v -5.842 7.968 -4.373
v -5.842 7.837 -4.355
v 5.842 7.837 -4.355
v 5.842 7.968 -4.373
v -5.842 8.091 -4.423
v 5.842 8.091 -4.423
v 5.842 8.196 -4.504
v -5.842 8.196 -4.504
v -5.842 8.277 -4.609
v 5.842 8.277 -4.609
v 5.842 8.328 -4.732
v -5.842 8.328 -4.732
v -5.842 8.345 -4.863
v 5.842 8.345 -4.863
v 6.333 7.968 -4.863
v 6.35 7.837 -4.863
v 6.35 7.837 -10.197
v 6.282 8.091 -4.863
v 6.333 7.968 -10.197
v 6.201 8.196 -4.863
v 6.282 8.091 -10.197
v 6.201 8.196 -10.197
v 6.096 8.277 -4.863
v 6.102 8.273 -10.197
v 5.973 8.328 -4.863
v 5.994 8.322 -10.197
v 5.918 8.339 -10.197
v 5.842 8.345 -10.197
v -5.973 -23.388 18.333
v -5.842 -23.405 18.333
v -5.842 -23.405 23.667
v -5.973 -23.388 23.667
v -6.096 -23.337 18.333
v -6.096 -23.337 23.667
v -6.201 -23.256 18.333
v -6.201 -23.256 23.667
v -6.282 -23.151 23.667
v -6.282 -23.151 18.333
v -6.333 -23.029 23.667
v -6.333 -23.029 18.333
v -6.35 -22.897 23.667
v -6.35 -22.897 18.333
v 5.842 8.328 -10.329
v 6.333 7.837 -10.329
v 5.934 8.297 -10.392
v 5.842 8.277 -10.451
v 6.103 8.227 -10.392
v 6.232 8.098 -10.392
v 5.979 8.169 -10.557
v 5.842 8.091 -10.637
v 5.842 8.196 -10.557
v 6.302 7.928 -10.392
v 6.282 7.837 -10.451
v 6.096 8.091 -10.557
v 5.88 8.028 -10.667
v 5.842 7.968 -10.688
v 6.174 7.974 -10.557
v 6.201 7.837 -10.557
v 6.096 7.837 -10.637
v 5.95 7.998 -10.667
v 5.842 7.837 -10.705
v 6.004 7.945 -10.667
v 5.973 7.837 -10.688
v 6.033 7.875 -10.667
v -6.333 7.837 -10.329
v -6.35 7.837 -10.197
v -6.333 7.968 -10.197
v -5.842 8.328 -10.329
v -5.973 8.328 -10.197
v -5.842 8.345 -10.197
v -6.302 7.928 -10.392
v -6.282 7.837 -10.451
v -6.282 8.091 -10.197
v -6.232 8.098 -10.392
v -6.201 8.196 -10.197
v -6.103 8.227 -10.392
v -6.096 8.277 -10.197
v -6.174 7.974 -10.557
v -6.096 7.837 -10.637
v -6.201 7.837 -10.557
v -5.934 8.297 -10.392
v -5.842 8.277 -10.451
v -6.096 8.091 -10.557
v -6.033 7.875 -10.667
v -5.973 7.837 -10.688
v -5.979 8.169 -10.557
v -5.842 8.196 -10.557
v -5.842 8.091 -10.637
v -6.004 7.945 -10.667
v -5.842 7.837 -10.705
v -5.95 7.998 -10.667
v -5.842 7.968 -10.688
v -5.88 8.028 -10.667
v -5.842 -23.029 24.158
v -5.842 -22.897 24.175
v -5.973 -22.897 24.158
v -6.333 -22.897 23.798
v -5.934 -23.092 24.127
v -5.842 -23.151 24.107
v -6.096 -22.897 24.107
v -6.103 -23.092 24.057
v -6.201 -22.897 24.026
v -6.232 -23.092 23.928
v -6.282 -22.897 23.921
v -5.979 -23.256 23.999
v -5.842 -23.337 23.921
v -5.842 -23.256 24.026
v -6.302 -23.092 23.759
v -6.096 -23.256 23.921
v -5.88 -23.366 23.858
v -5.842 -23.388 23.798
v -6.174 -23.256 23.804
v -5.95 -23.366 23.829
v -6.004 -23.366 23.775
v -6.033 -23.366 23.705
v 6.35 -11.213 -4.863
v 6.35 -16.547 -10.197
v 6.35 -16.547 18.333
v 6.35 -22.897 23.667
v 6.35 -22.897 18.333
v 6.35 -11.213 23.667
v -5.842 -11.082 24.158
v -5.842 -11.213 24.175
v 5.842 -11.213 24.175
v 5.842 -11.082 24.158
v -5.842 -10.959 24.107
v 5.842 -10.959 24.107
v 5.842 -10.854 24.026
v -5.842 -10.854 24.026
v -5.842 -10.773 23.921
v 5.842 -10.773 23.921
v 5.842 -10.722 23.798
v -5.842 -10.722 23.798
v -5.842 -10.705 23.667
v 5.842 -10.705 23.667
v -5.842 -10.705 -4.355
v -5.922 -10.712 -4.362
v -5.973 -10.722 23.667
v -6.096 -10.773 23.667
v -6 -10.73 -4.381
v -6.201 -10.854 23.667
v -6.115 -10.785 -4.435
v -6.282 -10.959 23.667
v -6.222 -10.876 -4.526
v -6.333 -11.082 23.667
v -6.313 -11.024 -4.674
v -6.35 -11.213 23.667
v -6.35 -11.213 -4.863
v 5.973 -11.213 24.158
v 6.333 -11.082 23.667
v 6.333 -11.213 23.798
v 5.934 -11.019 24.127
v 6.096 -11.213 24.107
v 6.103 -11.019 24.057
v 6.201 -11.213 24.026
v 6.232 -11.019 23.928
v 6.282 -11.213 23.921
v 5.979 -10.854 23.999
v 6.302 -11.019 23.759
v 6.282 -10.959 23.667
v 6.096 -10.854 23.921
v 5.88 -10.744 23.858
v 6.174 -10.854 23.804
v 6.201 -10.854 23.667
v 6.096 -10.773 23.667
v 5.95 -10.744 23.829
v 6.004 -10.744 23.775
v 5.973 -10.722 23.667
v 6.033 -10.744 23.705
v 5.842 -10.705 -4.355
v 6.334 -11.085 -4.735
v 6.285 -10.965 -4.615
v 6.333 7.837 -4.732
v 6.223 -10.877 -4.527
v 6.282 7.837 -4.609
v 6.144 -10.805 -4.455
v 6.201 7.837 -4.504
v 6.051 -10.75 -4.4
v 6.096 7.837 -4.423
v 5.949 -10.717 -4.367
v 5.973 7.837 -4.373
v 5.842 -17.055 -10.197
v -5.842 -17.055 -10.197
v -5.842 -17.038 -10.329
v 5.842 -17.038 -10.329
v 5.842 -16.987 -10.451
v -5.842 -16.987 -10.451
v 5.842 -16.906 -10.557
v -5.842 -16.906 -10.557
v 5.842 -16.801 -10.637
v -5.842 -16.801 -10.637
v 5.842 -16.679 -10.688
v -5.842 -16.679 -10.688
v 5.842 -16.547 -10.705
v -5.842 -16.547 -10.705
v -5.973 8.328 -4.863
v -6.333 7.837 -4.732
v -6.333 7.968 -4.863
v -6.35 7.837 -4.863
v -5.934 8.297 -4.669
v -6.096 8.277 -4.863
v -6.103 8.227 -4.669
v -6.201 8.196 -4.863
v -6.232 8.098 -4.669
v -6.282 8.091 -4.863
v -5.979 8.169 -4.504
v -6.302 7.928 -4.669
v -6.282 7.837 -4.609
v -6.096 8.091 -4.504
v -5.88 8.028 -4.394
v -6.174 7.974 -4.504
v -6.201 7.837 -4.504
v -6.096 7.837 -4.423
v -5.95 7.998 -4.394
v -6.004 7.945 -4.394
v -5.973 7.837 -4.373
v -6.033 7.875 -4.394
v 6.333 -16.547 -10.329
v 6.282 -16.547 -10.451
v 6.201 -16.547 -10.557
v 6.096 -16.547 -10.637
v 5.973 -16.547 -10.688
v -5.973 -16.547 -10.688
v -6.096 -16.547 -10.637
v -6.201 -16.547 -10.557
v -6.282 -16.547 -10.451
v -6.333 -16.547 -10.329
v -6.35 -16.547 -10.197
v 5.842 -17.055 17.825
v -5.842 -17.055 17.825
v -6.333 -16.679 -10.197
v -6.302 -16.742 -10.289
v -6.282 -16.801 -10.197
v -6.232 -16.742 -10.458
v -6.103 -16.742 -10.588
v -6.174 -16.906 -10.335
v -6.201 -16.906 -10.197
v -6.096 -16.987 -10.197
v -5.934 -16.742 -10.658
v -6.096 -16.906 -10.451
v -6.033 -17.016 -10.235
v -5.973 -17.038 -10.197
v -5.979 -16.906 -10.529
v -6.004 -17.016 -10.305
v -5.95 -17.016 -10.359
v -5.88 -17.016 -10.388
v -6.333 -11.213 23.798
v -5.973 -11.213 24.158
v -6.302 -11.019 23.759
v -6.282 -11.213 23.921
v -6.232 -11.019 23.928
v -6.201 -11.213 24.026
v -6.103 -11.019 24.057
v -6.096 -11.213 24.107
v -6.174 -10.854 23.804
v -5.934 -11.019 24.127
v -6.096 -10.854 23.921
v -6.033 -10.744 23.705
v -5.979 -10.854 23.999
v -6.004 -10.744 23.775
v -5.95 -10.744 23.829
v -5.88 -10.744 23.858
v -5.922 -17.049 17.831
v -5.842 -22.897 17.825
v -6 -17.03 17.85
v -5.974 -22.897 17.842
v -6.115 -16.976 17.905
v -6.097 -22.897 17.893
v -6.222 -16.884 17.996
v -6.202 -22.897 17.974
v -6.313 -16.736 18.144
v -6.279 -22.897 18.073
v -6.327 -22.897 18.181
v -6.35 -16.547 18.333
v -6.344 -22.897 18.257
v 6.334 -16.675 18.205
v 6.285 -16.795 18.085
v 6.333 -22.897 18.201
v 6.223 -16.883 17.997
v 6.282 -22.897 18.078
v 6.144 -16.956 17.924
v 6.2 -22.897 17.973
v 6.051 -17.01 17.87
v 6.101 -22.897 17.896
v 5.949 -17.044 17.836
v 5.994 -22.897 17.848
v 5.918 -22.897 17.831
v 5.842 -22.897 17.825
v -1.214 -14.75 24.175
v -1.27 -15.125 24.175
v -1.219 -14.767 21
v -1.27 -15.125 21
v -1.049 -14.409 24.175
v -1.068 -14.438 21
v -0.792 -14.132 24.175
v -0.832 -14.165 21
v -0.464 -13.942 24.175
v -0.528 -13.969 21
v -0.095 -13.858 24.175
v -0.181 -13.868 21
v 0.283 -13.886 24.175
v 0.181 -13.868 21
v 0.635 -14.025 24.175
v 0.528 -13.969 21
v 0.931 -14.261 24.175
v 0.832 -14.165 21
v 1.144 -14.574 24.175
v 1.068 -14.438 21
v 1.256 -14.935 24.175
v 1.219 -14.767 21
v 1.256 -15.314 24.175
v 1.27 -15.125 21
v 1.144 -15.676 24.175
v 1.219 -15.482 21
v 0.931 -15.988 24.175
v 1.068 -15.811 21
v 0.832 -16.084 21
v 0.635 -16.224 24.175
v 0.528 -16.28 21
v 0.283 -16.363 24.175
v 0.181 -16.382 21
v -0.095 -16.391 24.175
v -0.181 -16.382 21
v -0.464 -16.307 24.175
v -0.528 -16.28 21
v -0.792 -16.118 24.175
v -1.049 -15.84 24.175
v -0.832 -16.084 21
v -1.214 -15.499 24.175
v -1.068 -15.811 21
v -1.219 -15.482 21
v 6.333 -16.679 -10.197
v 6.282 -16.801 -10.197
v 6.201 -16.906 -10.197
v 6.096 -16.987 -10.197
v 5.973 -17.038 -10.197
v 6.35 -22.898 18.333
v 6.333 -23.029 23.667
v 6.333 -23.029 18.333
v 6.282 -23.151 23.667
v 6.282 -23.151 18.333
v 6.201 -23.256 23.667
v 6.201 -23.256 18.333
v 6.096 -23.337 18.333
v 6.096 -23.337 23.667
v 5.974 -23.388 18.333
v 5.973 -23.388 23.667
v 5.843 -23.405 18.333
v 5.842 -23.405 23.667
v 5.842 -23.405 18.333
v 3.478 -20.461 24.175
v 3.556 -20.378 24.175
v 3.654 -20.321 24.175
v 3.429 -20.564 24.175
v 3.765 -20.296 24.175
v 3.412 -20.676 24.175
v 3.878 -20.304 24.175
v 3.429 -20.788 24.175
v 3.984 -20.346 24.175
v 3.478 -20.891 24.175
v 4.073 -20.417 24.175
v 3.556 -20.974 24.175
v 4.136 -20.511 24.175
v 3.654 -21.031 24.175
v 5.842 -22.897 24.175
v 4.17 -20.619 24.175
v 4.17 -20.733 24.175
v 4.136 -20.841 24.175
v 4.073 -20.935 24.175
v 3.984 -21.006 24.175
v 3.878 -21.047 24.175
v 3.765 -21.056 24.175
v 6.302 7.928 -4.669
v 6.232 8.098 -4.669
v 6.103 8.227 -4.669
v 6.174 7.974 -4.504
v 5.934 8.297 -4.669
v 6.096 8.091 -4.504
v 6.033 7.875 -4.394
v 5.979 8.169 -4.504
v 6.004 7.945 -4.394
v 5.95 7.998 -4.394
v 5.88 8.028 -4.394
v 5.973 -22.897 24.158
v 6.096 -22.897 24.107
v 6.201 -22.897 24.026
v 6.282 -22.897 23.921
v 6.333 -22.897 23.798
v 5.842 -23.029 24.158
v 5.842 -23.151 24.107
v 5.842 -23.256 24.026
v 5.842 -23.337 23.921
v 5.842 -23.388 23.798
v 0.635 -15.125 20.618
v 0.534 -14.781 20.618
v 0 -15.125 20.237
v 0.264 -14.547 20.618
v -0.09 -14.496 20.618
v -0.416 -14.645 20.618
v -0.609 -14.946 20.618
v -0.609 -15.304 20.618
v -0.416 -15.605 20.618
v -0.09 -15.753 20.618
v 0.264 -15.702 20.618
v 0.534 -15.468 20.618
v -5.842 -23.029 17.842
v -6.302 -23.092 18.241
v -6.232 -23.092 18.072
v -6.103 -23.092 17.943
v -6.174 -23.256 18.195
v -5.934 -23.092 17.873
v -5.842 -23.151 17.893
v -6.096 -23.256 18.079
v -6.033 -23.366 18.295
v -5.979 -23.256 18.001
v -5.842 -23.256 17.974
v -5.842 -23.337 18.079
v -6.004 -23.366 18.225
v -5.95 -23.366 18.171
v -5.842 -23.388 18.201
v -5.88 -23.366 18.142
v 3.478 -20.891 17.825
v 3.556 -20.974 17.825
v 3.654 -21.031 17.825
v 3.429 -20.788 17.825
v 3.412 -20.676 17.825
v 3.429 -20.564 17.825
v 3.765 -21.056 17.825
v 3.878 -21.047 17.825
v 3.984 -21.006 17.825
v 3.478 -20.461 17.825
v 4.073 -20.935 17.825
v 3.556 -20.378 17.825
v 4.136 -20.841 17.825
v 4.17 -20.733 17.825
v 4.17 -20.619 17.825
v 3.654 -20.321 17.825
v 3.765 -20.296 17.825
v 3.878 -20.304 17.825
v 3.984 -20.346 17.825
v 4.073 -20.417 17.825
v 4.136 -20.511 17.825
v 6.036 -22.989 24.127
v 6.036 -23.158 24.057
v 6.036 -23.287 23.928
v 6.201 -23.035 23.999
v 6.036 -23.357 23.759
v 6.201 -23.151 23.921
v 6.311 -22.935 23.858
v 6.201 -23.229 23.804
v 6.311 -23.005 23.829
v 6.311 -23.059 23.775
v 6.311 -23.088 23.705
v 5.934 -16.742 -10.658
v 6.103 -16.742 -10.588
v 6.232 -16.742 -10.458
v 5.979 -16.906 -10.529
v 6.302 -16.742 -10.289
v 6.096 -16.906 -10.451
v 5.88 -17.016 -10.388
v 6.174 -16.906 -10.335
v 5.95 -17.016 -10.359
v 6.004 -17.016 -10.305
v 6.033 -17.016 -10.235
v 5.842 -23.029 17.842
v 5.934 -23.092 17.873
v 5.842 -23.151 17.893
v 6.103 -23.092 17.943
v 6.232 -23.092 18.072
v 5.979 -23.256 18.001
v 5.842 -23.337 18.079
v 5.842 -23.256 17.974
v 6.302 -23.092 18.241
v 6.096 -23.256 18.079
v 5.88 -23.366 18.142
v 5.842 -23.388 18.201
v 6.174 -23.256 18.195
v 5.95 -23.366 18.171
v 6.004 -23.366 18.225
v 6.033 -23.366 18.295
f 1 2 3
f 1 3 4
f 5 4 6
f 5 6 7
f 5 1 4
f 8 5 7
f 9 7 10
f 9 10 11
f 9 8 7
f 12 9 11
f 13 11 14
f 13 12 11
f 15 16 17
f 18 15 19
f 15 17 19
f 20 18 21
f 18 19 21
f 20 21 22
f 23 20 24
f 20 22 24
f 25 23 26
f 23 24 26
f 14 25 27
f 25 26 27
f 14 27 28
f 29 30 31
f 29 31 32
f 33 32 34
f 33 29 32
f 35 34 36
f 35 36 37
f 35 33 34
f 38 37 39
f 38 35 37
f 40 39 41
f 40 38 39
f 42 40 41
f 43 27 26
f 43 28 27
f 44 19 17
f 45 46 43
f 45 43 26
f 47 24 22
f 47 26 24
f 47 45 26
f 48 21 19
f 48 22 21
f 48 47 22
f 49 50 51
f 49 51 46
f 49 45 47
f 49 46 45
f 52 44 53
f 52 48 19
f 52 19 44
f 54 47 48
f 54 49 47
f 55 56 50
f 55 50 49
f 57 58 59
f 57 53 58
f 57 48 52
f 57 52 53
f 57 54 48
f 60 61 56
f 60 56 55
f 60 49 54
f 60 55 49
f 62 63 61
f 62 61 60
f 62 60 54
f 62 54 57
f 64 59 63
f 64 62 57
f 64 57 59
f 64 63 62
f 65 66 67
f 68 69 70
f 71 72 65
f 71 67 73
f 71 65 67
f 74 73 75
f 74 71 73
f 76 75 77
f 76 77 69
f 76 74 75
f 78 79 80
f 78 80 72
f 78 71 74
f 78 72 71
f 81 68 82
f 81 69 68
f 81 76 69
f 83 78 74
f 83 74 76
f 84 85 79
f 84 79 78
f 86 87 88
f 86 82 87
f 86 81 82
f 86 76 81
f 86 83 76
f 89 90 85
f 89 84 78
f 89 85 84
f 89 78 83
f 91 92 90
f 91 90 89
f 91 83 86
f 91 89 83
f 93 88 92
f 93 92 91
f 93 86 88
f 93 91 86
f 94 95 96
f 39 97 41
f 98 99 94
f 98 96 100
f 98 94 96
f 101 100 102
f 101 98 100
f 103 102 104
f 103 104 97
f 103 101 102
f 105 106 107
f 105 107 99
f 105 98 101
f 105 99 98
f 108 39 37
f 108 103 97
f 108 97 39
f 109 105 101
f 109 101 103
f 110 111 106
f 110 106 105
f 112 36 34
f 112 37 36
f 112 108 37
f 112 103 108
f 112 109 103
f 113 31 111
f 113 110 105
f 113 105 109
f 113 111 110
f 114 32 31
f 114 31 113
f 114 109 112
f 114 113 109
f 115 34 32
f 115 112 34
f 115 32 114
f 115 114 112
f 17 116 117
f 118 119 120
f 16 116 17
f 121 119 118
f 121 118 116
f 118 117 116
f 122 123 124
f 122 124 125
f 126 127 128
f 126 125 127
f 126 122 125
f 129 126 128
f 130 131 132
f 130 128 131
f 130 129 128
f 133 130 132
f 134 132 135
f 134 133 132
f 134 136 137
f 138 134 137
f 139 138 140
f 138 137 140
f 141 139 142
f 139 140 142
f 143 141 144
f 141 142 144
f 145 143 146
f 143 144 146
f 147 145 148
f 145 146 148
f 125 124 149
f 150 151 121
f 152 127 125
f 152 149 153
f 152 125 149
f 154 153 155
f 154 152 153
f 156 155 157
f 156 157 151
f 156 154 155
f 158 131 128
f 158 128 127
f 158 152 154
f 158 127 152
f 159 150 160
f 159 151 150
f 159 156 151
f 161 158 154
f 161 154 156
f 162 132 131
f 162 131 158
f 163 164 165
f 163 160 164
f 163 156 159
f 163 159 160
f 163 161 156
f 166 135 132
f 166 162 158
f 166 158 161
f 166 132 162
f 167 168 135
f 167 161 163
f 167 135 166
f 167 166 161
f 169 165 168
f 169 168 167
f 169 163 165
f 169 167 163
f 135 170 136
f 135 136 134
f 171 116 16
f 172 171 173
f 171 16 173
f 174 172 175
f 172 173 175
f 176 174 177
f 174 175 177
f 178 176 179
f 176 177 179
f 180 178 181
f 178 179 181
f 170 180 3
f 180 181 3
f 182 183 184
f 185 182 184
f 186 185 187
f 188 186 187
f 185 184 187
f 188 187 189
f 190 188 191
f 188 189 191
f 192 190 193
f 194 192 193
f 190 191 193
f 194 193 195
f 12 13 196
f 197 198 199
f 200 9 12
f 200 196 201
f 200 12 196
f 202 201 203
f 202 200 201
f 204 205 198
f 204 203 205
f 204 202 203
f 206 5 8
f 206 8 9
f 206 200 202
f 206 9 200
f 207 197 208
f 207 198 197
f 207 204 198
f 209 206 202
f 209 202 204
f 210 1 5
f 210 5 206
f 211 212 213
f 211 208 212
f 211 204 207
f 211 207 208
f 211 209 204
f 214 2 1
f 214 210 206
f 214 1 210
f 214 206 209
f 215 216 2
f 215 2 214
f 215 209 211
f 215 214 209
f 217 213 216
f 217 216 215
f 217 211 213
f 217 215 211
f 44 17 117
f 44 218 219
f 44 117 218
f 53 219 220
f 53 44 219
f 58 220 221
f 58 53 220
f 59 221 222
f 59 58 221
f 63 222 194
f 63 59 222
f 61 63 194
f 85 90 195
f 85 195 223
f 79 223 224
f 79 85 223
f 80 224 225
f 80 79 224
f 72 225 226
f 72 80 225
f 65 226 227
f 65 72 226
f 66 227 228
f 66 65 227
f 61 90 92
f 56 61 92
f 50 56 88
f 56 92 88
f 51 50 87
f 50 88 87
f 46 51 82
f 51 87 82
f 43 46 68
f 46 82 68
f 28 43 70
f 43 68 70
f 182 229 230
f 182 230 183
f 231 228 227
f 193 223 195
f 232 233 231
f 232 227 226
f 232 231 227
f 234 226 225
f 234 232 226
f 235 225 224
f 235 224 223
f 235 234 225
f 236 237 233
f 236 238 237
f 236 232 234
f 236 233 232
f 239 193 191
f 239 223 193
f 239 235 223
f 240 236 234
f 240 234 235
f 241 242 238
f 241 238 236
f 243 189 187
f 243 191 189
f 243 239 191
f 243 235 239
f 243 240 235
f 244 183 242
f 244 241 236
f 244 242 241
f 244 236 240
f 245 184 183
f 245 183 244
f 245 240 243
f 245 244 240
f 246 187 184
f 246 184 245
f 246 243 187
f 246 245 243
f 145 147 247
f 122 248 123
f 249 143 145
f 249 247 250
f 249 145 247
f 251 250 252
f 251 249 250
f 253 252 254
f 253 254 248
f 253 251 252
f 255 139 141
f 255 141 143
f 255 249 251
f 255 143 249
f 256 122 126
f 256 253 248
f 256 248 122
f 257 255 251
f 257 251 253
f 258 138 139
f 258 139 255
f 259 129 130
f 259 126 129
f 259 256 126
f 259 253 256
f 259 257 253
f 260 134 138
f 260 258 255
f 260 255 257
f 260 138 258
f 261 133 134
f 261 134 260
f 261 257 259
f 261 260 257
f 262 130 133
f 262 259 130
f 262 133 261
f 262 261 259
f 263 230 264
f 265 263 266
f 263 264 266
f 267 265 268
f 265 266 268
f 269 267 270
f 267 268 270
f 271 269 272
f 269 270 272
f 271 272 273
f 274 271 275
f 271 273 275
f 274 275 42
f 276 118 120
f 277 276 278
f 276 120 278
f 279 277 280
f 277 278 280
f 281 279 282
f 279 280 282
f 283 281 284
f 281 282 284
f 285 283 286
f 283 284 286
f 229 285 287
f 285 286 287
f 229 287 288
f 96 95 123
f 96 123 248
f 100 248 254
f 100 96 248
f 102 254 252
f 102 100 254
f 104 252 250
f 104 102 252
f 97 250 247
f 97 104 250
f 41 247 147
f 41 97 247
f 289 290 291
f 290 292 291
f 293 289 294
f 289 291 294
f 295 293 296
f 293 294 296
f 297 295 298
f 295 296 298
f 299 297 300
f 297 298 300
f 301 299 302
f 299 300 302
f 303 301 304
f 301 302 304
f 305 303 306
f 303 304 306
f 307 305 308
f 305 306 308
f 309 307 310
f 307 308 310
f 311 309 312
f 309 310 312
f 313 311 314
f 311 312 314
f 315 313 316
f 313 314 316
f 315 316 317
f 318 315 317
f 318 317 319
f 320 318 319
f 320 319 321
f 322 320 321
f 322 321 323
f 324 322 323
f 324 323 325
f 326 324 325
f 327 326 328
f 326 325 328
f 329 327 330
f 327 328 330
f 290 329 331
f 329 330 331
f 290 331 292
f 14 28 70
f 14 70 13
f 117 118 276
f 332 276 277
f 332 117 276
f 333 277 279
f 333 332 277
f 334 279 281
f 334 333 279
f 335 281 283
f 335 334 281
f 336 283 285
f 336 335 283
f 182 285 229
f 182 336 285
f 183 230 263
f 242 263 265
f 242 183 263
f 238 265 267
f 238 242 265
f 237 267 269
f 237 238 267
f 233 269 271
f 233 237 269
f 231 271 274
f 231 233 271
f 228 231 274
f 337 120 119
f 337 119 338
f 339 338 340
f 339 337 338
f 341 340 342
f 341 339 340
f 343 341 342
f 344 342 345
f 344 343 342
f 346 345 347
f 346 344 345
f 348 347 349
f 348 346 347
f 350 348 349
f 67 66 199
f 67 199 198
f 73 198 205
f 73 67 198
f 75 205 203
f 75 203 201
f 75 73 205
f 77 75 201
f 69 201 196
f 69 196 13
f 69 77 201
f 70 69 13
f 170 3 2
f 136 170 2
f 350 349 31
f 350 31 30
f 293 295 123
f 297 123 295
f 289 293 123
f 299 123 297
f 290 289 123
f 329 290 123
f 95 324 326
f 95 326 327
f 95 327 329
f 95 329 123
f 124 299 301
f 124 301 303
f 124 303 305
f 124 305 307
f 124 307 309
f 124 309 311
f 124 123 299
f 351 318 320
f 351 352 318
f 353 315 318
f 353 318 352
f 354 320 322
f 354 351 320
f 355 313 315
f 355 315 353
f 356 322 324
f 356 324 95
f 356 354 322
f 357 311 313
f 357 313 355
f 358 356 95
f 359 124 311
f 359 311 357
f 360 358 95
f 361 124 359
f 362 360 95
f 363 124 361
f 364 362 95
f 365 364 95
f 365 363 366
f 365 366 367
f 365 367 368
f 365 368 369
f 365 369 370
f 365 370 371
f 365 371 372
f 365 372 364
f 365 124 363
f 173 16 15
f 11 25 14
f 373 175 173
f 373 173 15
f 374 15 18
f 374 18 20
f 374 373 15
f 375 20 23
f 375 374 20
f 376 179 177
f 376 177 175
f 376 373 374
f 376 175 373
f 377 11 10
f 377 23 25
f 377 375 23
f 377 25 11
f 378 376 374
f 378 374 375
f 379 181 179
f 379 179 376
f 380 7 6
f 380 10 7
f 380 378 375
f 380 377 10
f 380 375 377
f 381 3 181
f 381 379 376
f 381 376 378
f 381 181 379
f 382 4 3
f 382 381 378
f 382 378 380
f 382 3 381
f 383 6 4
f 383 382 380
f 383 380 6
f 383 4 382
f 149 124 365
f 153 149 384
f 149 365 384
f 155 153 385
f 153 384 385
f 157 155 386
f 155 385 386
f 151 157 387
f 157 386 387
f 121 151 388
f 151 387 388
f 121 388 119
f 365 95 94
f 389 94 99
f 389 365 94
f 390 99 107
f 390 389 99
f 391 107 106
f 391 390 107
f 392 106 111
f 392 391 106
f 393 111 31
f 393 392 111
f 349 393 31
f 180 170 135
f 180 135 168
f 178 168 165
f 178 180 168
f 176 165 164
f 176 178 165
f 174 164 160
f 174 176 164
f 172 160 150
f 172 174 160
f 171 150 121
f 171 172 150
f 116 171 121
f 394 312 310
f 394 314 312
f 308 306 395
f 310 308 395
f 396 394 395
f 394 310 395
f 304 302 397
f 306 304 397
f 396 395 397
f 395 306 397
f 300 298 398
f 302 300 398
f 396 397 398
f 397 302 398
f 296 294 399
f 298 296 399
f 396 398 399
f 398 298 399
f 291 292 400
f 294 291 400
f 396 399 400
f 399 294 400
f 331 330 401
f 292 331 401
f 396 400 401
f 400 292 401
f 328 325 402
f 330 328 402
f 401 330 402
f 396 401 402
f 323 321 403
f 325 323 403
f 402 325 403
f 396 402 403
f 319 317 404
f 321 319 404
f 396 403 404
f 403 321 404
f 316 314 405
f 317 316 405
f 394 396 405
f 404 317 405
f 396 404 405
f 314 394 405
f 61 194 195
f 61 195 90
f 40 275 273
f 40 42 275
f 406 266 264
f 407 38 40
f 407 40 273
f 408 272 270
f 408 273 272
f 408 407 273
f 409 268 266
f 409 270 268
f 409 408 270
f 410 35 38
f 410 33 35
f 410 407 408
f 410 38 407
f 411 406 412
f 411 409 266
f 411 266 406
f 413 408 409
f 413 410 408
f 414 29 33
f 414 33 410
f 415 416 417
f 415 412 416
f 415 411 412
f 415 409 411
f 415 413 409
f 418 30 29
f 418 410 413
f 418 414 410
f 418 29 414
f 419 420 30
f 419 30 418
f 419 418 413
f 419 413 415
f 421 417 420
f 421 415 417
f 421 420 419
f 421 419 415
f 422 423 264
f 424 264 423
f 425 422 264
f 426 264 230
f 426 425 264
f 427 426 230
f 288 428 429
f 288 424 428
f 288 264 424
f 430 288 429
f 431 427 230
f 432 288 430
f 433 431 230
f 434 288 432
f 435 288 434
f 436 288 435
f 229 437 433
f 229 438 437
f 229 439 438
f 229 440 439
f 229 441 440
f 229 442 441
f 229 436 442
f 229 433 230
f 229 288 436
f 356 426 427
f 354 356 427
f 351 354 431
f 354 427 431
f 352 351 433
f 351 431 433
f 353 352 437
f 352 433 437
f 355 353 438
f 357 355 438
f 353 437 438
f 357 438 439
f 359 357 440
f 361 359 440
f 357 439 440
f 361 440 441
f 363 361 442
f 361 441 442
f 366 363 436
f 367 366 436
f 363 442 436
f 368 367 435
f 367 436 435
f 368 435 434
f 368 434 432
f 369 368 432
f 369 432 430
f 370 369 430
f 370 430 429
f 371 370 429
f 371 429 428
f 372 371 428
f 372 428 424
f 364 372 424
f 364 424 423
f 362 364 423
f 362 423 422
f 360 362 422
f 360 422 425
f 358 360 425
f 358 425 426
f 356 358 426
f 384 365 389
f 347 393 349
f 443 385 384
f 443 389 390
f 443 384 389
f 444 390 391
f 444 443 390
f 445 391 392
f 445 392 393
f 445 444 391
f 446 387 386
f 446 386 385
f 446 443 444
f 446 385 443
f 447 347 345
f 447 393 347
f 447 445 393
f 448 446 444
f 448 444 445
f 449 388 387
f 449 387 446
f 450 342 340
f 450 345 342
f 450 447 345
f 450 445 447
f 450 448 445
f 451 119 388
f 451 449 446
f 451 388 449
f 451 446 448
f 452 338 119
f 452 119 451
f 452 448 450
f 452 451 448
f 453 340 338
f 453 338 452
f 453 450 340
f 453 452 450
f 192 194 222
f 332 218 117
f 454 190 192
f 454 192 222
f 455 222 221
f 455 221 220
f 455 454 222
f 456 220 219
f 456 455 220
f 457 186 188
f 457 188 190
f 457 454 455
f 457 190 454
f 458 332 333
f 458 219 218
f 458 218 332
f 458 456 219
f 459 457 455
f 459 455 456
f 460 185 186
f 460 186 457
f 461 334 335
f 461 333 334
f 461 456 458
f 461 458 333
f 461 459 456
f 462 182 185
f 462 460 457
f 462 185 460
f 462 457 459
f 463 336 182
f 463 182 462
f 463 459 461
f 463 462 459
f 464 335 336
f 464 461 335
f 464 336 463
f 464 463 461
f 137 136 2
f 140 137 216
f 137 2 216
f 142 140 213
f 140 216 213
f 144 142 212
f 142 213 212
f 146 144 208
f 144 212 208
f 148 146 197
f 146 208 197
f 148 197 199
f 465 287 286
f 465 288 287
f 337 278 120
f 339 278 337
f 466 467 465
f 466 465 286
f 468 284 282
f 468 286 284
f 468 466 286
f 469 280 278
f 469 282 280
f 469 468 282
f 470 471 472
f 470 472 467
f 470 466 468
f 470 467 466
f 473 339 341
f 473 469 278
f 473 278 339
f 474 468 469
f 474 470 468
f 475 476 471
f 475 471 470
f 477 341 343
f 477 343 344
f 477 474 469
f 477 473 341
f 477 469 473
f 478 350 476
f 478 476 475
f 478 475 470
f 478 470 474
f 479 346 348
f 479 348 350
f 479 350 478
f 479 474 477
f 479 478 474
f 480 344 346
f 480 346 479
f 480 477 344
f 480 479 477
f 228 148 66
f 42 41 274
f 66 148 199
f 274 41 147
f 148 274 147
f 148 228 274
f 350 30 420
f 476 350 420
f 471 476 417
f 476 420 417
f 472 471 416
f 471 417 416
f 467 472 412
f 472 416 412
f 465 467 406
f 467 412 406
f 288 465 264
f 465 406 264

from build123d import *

# Parameters (mm, degrees)
F1_DEPTH      = 6.35
F1_DEPTH_BACK = 6.35
F2_R          = 0.508
F3_T1_DEPTH   = 7.112
F3_T3_DEPTH   = 7.62
F3_T5_DEPTH   = 28.0222646616
F3_T7_DEPTH   = 29.8002646616
F3_T9_DEPTH   = 27.94
F3_T11_DEPTH  = 20.32
F3_T13_DEPTH  = 8.89
F3_S17_W      = 0.508
F3_S17_H      = 0.508
F3_T18_DEPTH  = 0.508
F3_S23_W      = 0.508
F3_S23_H      = 0.508
F3_T24_DEPTH  = 0.508
F3_T31_DEPTH  = 8.89
F3_T35_DEPTH  = 31.0702646616
F3_T42_DEPTH  = 29.2922646616
F3_T46_DEPTH  = 21.59
F4_T1_DEPTH   = 28.0222646616
F4_T3_DEPTH   = 11.684
F4_T5_DEPTH   = 5.334
F4_T7_DEPTH   = 26.162
F4_T9_DEPTH   = 29.8002646616
F4_T11_DEPTH  = 18.542
F4_T13_DEPTH  = 7.62
F4_T15_DEPTH  = 7.112
F4_S19_W      = 0.508
F4_S19_H      = 0.508
F4_T20_DEPTH  = 0.508
F4_S25_W      = 0.508
F4_S25_H      = 0.508
F4_T26_DEPTH  = 0.508
F4_S31_W      = 0.508
F4_S31_H      = 0.508
F4_T32_DEPTH  = 0.508
F4_S37_W      = 0.508
F4_S37_H      = 0.508
F4_T38_DEPTH  = 0.508
F4_S43_W      = 0.508
F4_S43_H      = 0.508
F4_T44_DEPTH  = 0.508
F4_S49_W      = 0.508
F4_S49_H      = 0.508
F4_T50_DEPTH  = 0.508
F4_T57_DEPTH  = 19.812
F4_T61_DEPTH  = 29.2922646616
F4_T68_DEPTH  = 31.0702646616
F4_T72_DEPTH  = 8.89
F5_T1_DEPTH   = 11.684
F5_S5_W       = 0.508
F5_S5_H       = 0.508
F5_T6_DEPTH   = 0.508
F5_S11_W      = 0.508
F5_S11_H      = 0.508
F5_T12_DEPTH  = 0.508
F6_T1_DEPTH   = 11.684
F6_S5_W       = 0.508
F6_S5_H       = 0.508
F6_T6_DEPTH   = 0.508
F6_S11_W      = 0.508
F6_S11_H      = 0.508
F6_T12_DEPTH  = 0.508
F8_D          = 2.54
F8_DEPTH      = 3.175
F8_TIP        = 0.7630929862
F10_D         = 0.762


# Not quite as in the source:
# - a fillet or chamfer that OpenCascade refuses, or shapes differently, is made with other operations: its cross-section is extruded or revolved along the edge and cut away or added


with BuildPart() as f1:
    # F0 (on Right) → F1 (new body, two sides)
    with BuildSketch(Plane.YZ) as f1_sk:
        Polygon((-10.7051408962, 24.1749497761), (-23.4051408962, 24.1749497761), (-23.4051408962, 17.8249497761), (-17.0551408962, 17.8249497761), (-17.0551408962, -10.7053148855), (8.3448591038, -10.7053148855), (8.3448591038, -4.3553148855), (-10.7051408962, -4.3553148855), align=None)
    extrude(amount=F1_DEPTH)
    extrude(f1_sk.sketch, amount=-F1_DEPTH_BACK)

    # F2
    f2_edges = [f1.edges().sort_by_distance(p)[0] for p in [
        (0, -23.405141, 24.17495),
        (6.35, -17.055141, 24.17495),
        (0, -10.705141, 24.17495),
        (-6.35, -17.055141, 24.17495),
    ]]
    fillet(f2_edges, radius=F2_R)

    # F3: fillet of radius 0.508 on 7 edges, made by hand

    # F3_s2 → F3_t1 (cut)
    with BuildSketch(Plane.XY.offset(16.5549497761)):
        with BuildLine():
            ThreePointArc((6.35, -22.8971408962), (6.2012102448, -23.256351141), (5.842, -23.4051408962))
            Line((5.842, -23.4051408962), (6.35, -23.4051408962))
            Line((6.35, -23.4051408962), (6.35, -22.8971408962))
        make_face()
    extrude(amount=F3_T1_DEPTH, mode=Mode.SUBTRACT)

    # F3_s4 → F3_t3 (cut)
    with BuildSketch(Plane.XZ.offset(17.0551408962)):
        with BuildLine():
            ThreePointArc((6.35, 18.3329497761), (6.2012102448, 17.9737395313), (5.842, 17.8249497761))
            Line((5.842, 17.8249497761), (6.35, 17.8249497761))
            Line((6.35, 17.8249497761), (6.35, 18.3329497761))
        make_face()
    extrude(amount=F3_T3_DEPTH, mode=Mode.SUBTRACT)

    # F3_s6 → F3_t5 (cut)
    with BuildSketch(Plane.XY.offset(-4.3553148855)):
        with BuildLine():
            ThreePointArc((5.842, -10.7051408962), (6.2012102448, -10.8539306514), (6.35, -11.2131408962))
            Line((6.35, -11.2131408962), (6.35, -10.7051408962))
            Line((6.35, -10.7051408962), (5.842, -10.7051408962))
        make_face()
    extrude(amount=F3_T5_DEPTH, mode=Mode.SUBTRACT)

    # F3_s8 → F3_t7 (cut)
    with BuildSketch(Plane.XY.offset(-11.9753148855)):
        with BuildLine():
            ThreePointArc((6.35, -16.5471408962), (6.2012102448, -16.906351141), (5.842, -17.0551408962))
            Line((5.842, -17.0551408962), (6.35, -17.0551408962))
            Line((6.35, -17.0551408962), (6.35, -16.5471408962))
        make_face()
    extrude(amount=F3_T7_DEPTH, mode=Mode.SUBTRACT)

    # F3_s10 → F3_t9 (cut)
    with BuildSketch(Plane.XZ.offset(-9.6148591038)):
        with BuildLine():
            ThreePointArc((6.35, -10.1973148855), (6.2012102448, -10.5565251304), (5.842, -10.7053148855))
            Line((5.842, -10.7053148855), (6.35, -10.7053148855))
            Line((6.35, -10.7053148855), (6.35, -10.1973148855))
        make_face()
    extrude(amount=F3_T9_DEPTH, mode=Mode.SUBTRACT)

    # F3_s12 → F3_t11 (cut)
    with BuildSketch(Plane.XZ.offset(-9.6148591038)):
        with BuildLine():
            ThreePointArc((6.35, -4.8633148855), (6.2012102448, -4.5041046407), (5.842, -4.3553148855))
            Line((5.842, -4.3553148855), (6.35, -4.3553148855))
            Line((6.35, -4.3553148855), (6.35, -4.8633148855))
        make_face()
    extrude(amount=F3_T11_DEPTH, mode=Mode.SUBTRACT)

    # F3_s14 → F3_t13 (cut)
    with BuildSketch(Plane.XY.offset(-11.9753148855)):
        with BuildLine():
            ThreePointArc((6.35, 7.8368591038), (6.2012102448, 8.1960693486), (5.842, 8.3448591038))
            Line((5.842, 8.3448591038), (6.35, 8.3448591038))
            Line((6.35, 8.3448591038), (6.35, 7.8368591038))
        make_face()
    extrude(amount=F3_T13_DEPTH, mode=Mode.SUBTRACT)


with BuildPart() as f3_tool16:
    # F3_s17 → F3_t18 (new body)
    with BuildSketch(Plane.XZ.offset(11.2131408962)):
        with Locations((6.096, 23.9209497761)):
            Rectangle(F3_S17_W, F3_S17_H)
    extrude(amount=-F3_T18_DEPTH)

    # F3_s19 → F3_t20 (revolve, cut)
    with BuildSketch(Plane(origin=(5.842, -11.2131408962, 23.6669497761), x_dir=(-0.7071067812, 0, -0.7071067812), z_dir=(0.7071067812, 0, -0.7071067812))):
        with BuildLine():
            ThreePointArc((0, -0.508), (0.508, 0), (0, 0.508))
            Line((0, 0.508), (0, -0.508))
        make_face()
    revolve(axis=Axis((5.842, -11.2131408962, 23.6669497761), (0, 1, 0)), mode=Mode.SUBTRACT)


with BuildPart() as f1_1:
    add(f1.part)

    # F3_t15: cut F3_tool16
    add(f3_tool16.part, mode=Mode.SUBTRACT)


with BuildPart() as f3_tool22:
    # F3_s23 → F3_t24 (new body)
    with BuildSketch(Plane.YZ.offset(5.842)):
        with Locations((-23.1511408962, 23.9209497761)):
            Rectangle(F3_S23_W, F3_S23_H)
    extrude(amount=F3_T24_DEPTH)

    # F3_s25 → F3_t26 (revolve, cut)
    with BuildSketch(Plane(origin=(5.842, -22.8971408962, 23.6669497761), x_dir=(0, 0.7071067812, -0.7071067812), z_dir=(0, -0.7071067812, -0.7071067812))):
        with BuildLine():
            ThreePointArc((0, -0.508), (0.508, 0), (0, 0.508))
            Line((0, 0.508), (0, -0.508))
        make_face()
    revolve(axis=Axis((5.842, -22.8971408962, 23.6669497761), (1, 0, 0)), mode=Mode.SUBTRACT)


with BuildPart() as f1_2:
    add(f1_1.part)

    # F3_t21: cut F3_tool22
    add(f3_tool22.part, mode=Mode.SUBTRACT)


with BuildPart() as f3_tool29:
    # F3_s30 → F3_t31 (new body)
    with BuildSketch(Plane.XZ.offset(24.6751408962)):
        with BuildLine():
            ThreePointArc((6.35, 18.3329497761), (6.2012102448, 17.9737395313), (5.842, 17.8249497761))
            Line((5.842, 17.8249497761), (6.35, 17.8249497761))
            Line((6.35, 17.8249497761), (6.35, 18.3329497761))
        make_face()
    extrude(amount=-F3_T31_DEPTH)

    split(bisect_by=Plane.XZ.offset(17.0551408962), keep=Keep.BOTTOM)


with BuildPart() as f3_tool33:
    # F3_s34 → F3_t35 (new body)
    with BuildSketch(Plane.XY.offset(19.0949497761)):
        with BuildLine():
            ThreePointArc((6.35, -16.5471408962), (6.2012102448, -16.906351141), (5.842, -17.0551408962))
            Line((5.842, -17.0551408962), (6.35, -17.0551408962))
            Line((6.35, -17.0551408962), (6.35, -16.5471408962))
        make_face()
    extrude(amount=-F3_T35_DEPTH)

    split(bisect_by=Plane.XY.offset(17.8249497761), keep=Keep.TOP)


with BuildPart() as f3_tool29_1:
    add(f3_tool29.part)

    # F3_t37: intersect F3_tool33
    add(f3_tool33.part, mode=Mode.INTERSECT)


with BuildPart() as f1_3:
    add(f1_2.part)

    # F3_t27: cut F3_tool29
    add(f3_tool29_1.part, mode=Mode.SUBTRACT)


with BuildPart() as f3_tool40:
    # F3_s41 → F3_t42 (new body)
    with BuildSketch(Plane.XY.offset(-5.6253148855)):
        with BuildLine():
            ThreePointArc((5.842, -10.7051408962), (6.2012102448, -10.8539306514), (6.35, -11.2131408962))
            Line((6.35, -11.2131408962), (6.35, -10.7051408962))
            Line((6.35, -10.7051408962), (5.842, -10.7051408962))
        make_face()
    extrude(amount=F3_T42_DEPTH)

    split(bisect_by=Plane.XY.offset(-4.3553148855), keep=Keep.BOTTOM)


with BuildPart() as f3_tool44:
    # F3_s45 → F3_t46 (new body)
    with BuildSketch(Plane.XZ.offset(-9.6148591038)):
        with BuildLine():
            ThreePointArc((6.35, -4.8633148855), (6.2012102448, -4.5041046407), (5.842, -4.3553148855))
            Line((5.842, -4.3553148855), (6.35, -4.3553148855))
            Line((6.35, -4.3553148855), (6.35, -4.8633148855))
        make_face()
    extrude(amount=F3_T46_DEPTH)

    split(bisect_by=Plane.XZ.offset(10.7051408962), keep=Keep.TOP)


with BuildPart() as f3_tool40_1:
    add(f3_tool40.part)

    # F3_t48: intersect F3_tool44
    add(f3_tool44.part, mode=Mode.INTERSECT)


with BuildPart() as f1_4:
    add(f1_3.part)

    # F3_t38: cut F3_tool40
    add(f3_tool40_1.part, mode=Mode.SUBTRACT)

    # F4: fillet of radius 0.508 on 9 edges, made by hand

    # F4_s2 → F4_t1 (cut)
    with BuildSketch(Plane.XY.offset(-4.3553148855)):
        with BuildLine():
            ThreePointArc((-5.842, -10.7051408962), (-6.2012102448, -10.8539306514), (-6.35, -11.2131408962))
            Line((-6.35, -11.2131408962), (-6.35, -10.7051408962))
            Line((-6.35, -10.7051408962), (-5.842, -10.7051408962))
        make_face()
    extrude(amount=F4_T1_DEPTH, mode=Mode.SUBTRACT)

    # F4_s4 → F4_t3 (cut)
    with BuildSketch(Plane.YZ.offset(-5.842)):
        with BuildLine():
            ThreePointArc((7.8368591038, -4.3553148855), (8.1960693486, -4.5041046407), (8.3448591038, -4.8633148855))
            Line((8.3448591038, -4.8633148855), (8.3448591038, -4.3553148855))
            Line((8.3448591038, -4.3553148855), (7.8368591038, -4.3553148855))
        make_face()
        with BuildLine():
            ThreePointArc((7.8368591038, -10.7053148855), (8.1960693486, -10.5565251304), (8.3448591038, -10.1973148855))
            Line((8.3448591038, -10.1973148855), (8.3448591038, -10.7053148855))
            Line((8.3448591038, -10.7053148855), (7.8368591038, -10.7053148855))
        make_face()
    extrude(amount=F4_T3_DEPTH, mode=Mode.SUBTRACT)

    # F4_s6 → F4_t5 (cut)
    with BuildSketch(Plane.XY.offset(-10.1973148855)):
        with BuildLine():
            ThreePointArc((-6.35, 7.8368591038), (-6.2012102448, 8.1960693486), (-5.842, 8.3448591038))
            Line((-5.842, 8.3448591038), (-6.35, 8.3448591038))
            Line((-6.35, 8.3448591038), (-6.35, 7.8368591038))
        make_face()
    extrude(amount=F4_T5_DEPTH, mode=Mode.SUBTRACT)

    # F4_s8 → F4_t7 (cut)
    with BuildSketch(Plane.XZ.offset(-7.8368591038)):
        with BuildLine():
            ThreePointArc((-5.842, -10.7053148855), (-6.2012102448, -10.5565251304), (-6.35, -10.1973148855))
            Line((-6.35, -10.1973148855), (-6.35, -10.7053148855))
            Line((-6.35, -10.7053148855), (-5.842, -10.7053148855))
        make_face()
    extrude(amount=F4_T7_DEPTH, mode=Mode.SUBTRACT)

    # F4_s10 → F4_t9 (cut)
    with BuildSketch(Plane.XY.offset(-11.9753148855)):
        with BuildLine():
            ThreePointArc((-5.842, -17.0551408962), (-6.2012102448, -16.906351141), (-6.35, -16.5471408962))
            Line((-6.35, -16.5471408962), (-6.35, -17.0551408962))
            Line((-6.35, -17.0551408962), (-5.842, -17.0551408962))
        make_face()
    extrude(amount=F4_T9_DEPTH, mode=Mode.SUBTRACT)

    # F4_s12 → F4_t11 (cut)
    with BuildSketch(Plane.XZ.offset(-7.8368591038)):
        with BuildLine():
            ThreePointArc((-5.842, -4.3553148855), (-6.2012102448, -4.5041046407), (-6.35, -4.8633148855))
            Line((-6.35, -4.8633148855), (-6.35, -4.3553148855))
            Line((-6.35, -4.3553148855), (-5.842, -4.3553148855))
        make_face()
    extrude(amount=F4_T11_DEPTH, mode=Mode.SUBTRACT)

    # F4_s14 → F4_t13 (cut)
    with BuildSketch(Plane.XZ.offset(17.0551408962)):
        with BuildLine():
            ThreePointArc((-5.842, 17.8249497761), (-6.2012102448, 17.9737395313), (-6.35, 18.3329497761))
            Line((-6.35, 18.3329497761), (-6.35, 17.8249497761))
            Line((-6.35, 17.8249497761), (-5.842, 17.8249497761))
        make_face()
    extrude(amount=F4_T13_DEPTH, mode=Mode.SUBTRACT)

    # F4_s16 → F4_t15 (cut)
    with BuildSketch(Plane.XY.offset(16.5549497761)):
        with BuildLine():
            ThreePointArc((-5.842, -23.4051408962), (-6.2012102448, -23.256351141), (-6.35, -22.8971408962))
            Line((-6.35, -22.8971408962), (-6.35, -23.4051408962))
            Line((-6.35, -23.4051408962), (-5.842, -23.4051408962))
        make_face()
    extrude(amount=F4_T15_DEPTH, mode=Mode.SUBTRACT)


with BuildPart() as f4_tool18:
    # F4_s19 → F4_t20 (new body)
    with BuildSketch(Plane.XZ.offset(22.8971408962)):
        with Locations((-6.096, 23.9209497761)):
            Rectangle(F4_S19_W, F4_S19_H)
    extrude(amount=F4_T20_DEPTH)

    # F4_s21 → F4_t22 (revolve, cut)
    with BuildSketch(Plane(origin=(-5.842, -22.8971408962, 23.6669497761), x_dir=(0.7071067812, 0, -0.7071067812), z_dir=(-0.7071067812, 0, -0.7071067812))):
        with BuildLine():
            ThreePointArc((0, -0.508), (0.508, 0), (0, 0.508))
            Line((0, 0.508), (0, -0.508))
        make_face()
    revolve(axis=Axis((-5.842, -22.8971408962, 23.6669497761), (0, -1, 0)), mode=Mode.SUBTRACT)


with BuildPart() as f1_5:
    add(f1_4.part)

    # F4_t17: cut F4_tool18
    add(f4_tool18.part, mode=Mode.SUBTRACT)


with BuildPart() as f4_tool24:
    # F4_s25 → F4_t26 (new body)
    with BuildSketch(Plane.XY.offset(-10.1973148855)):
        with Locations((6.096, 8.0908591038)):
            Rectangle(F4_S25_W, F4_S25_H)
    extrude(amount=-F4_T26_DEPTH)

    # F4_s27 → F4_t28 (revolve, cut)
    with BuildSketch(Plane(origin=(5.842, 7.8368591038, -10.1973148855), x_dir=(-0.7071067812, -0.7071067812, 0), z_dir=(0.7071067812, -0.7071067812, 0))):
        with BuildLine():
            ThreePointArc((0, -0.508), (0.508, 0), (0, 0.508))
            Line((0, 0.508), (0, -0.508))
        make_face()
    revolve(axis=Axis((5.842, 7.8368591038, -10.1973148855), (0, 0, -1)), mode=Mode.SUBTRACT)


with BuildPart() as f1_6:
    add(f1_5.part)

    # F4_t23: cut F4_tool24
    add(f4_tool24.part, mode=Mode.SUBTRACT)


with BuildPart() as f4_tool30:
    # F4_s31 → F4_t32 (new body)
    with BuildSketch(Plane.XY.offset(-4.8633148855)):
        with Locations((6.096, 8.0908591038)):
            Rectangle(F4_S31_W, F4_S31_H)
    extrude(amount=F4_T32_DEPTH)

    # F4_s33 → F4_t34 (revolve, cut)
    with BuildSketch(Plane(origin=(5.842, 7.8368591038, -4.8633148855), x_dir=(-0.7071067812, -0.7071067812, 0), z_dir=(-0.7071067812, 0.7071067812, 0))):
        with BuildLine():
            ThreePointArc((0, -0.508), (0.508, 0), (0, 0.508))
            Line((0, 0.508), (0, -0.508))
        make_face()
    revolve(axis=Axis((5.842, 7.8368591038, -4.8633148855), (0, 0, 1)), mode=Mode.SUBTRACT)


with BuildPart() as f1_7:
    add(f1_6.part)

    # F4_t29: cut F4_tool30
    add(f4_tool30.part, mode=Mode.SUBTRACT)


with BuildPart() as f4_tool36:
    # F4_s37 → F4_t38 (new body)
    with BuildSketch(Plane.XZ.offset(11.2131408962)):
        with Locations((-6.096, 23.9209497761)):
            Rectangle(F4_S37_W, F4_S37_H)
    extrude(amount=-F4_T38_DEPTH)

    # F4_s39 → F4_t40 (revolve, cut)
    with BuildSketch(Plane(origin=(-5.842, -11.2131408962, 23.6669497761), x_dir=(0.7071067812, 0, -0.7071067812), z_dir=(0.7071067812, 0, 0.7071067812))):
        with BuildLine():
            ThreePointArc((0, -0.508), (0.508, 0), (0, 0.508))
            Line((0, 0.508), (0, -0.508))
        make_face()
    revolve(axis=Axis((-5.842, -11.2131408962, 23.6669497761), (0, 1, 0)), mode=Mode.SUBTRACT)


with BuildPart() as f1_8:
    add(f1_7.part)

    # F4_t35: cut F4_tool36
    add(f4_tool36.part, mode=Mode.SUBTRACT)


with BuildPart() as f4_tool42:
    # F4_s43 → F4_t44 (new body)
    with BuildSketch(Plane.XY.offset(-4.8633148855)):
        with Locations((-6.096, 8.0908591038)):
            Rectangle(F4_S43_W, F4_S43_H)
    extrude(amount=F4_T44_DEPTH)

    # F4_s45 → F4_t46 (revolve, cut)
    with BuildSketch(Plane(origin=(-5.842, 7.8368591038, -4.8633148855), x_dir=(0.7071067812, -0.7071067812, 0), z_dir=(-0.7071067812, -0.7071067812, 0))):
        with BuildLine():
            ThreePointArc((0, -0.508), (0.508, 0), (0, 0.508))
            Line((0, 0.508), (0, -0.508))
        make_face()
    revolve(axis=Axis((-5.842, 7.8368591038, -4.8633148855), (0, 0, 1)), mode=Mode.SUBTRACT)


with BuildPart() as f1_9:
    add(f1_8.part)

    # F4_t41: cut F4_tool42
    add(f4_tool42.part, mode=Mode.SUBTRACT)


with BuildPart() as f4_tool48:
    # F4_s49 → F4_t50 (new body)
    with BuildSketch(Plane.XY.offset(-10.1973148855)):
        with Locations((-6.096, 8.0908591038)):
            Rectangle(F4_S49_W, F4_S49_H)
    extrude(amount=-F4_T50_DEPTH)

    # F4_s51 → F4_t52 (revolve, cut)
    with BuildSketch(Plane(origin=(-5.842, 7.8368591038, -10.1973148855), x_dir=(0.7071067812, -0.7071067812, 0), z_dir=(0.7071067812, 0.7071067812, 0))):
        with BuildLine():
            ThreePointArc((0, -0.508), (0.508, 0), (0, 0.508))
            Line((0, 0.508), (0, -0.508))
        make_face()
    revolve(axis=Axis((-5.842, 7.8368591038, -10.1973148855), (0, 0, -1)), mode=Mode.SUBTRACT)


with BuildPart() as f1_10:
    add(f1_9.part)

    # F4_t47: cut F4_tool48
    add(f4_tool48.part, mode=Mode.SUBTRACT)


with BuildPart() as f4_tool55:
    # F4_s56 → F4_t57 (new body)
    with BuildSketch(Plane.XZ.offset(-7.8368591038)):
        with BuildLine():
            ThreePointArc((-5.842, -4.3553148855), (-6.2012102448, -4.5041046407), (-6.35, -4.8633148855))
            Line((-6.35, -4.8633148855), (-6.35, -4.3553148855))
            Line((-6.35, -4.3553148855), (-5.842, -4.3553148855))
        make_face()
    extrude(amount=F4_T57_DEPTH)

    split(bisect_by=Plane.XZ.offset(10.7051408962), keep=Keep.TOP)


with BuildPart() as f4_tool59:
    # F4_s60 → F4_t61 (new body)
    with BuildSketch(Plane.XY.offset(-5.6253148855)):
        with BuildLine():
            ThreePointArc((-5.842, -10.7051408962), (-6.2012102448, -10.8539306514), (-6.35, -11.2131408962))
            Line((-6.35, -11.2131408962), (-6.35, -10.7051408962))
            Line((-6.35, -10.7051408962), (-5.842, -10.7051408962))
        make_face()
    extrude(amount=F4_T61_DEPTH)

    split(bisect_by=Plane.XY.offset(-4.3553148855), keep=Keep.BOTTOM)


with BuildPart() as f4_tool55_1:
    add(f4_tool55.part)

    # F4_t63: intersect F4_tool59
    add(f4_tool59.part, mode=Mode.INTERSECT)


with BuildPart() as f1_11:
    add(f1_10.part)

    # F4_t53: cut F4_tool55
    add(f4_tool55_1.part, mode=Mode.SUBTRACT)


with BuildPart() as f4_tool66:
    # F4_s67 → F4_t68 (new body)
    with BuildSketch(Plane.XY.offset(19.0949497761)):
        with BuildLine():
            ThreePointArc((-5.842, -17.0551408962), (-6.2012102448, -16.906351141), (-6.35, -16.5471408962))
            Line((-6.35, -16.5471408962), (-6.35, -17.0551408962))
            Line((-6.35, -17.0551408962), (-5.842, -17.0551408962))
        make_face()
    extrude(amount=-F4_T68_DEPTH)

    split(bisect_by=Plane.XY.offset(17.8249497761), keep=Keep.TOP)


with BuildPart() as f4_tool70:
    # F4_s71 → F4_t72 (new body)
    with BuildSketch(Plane.XZ.offset(24.6751408962)):
        with BuildLine():
            ThreePointArc((-5.842, 17.8249497761), (-6.2012102448, 17.9737395313), (-6.35, 18.3329497761))
            Line((-6.35, 18.3329497761), (-6.35, 17.8249497761))
            Line((-6.35, 17.8249497761), (-5.842, 17.8249497761))
        make_face()
    extrude(amount=-F4_T72_DEPTH)

    split(bisect_by=Plane.XZ.offset(17.0551408962), keep=Keep.BOTTOM)


with BuildPart() as f4_tool66_1:
    add(f4_tool66.part)

    # F4_t74: intersect F4_tool70
    add(f4_tool70.part, mode=Mode.INTERSECT)


with BuildPart() as f1_12:
    add(f1_11.part)

    # F4_t64: cut F4_tool66
    add(f4_tool66_1.part, mode=Mode.SUBTRACT)

    # F5: fillet of radius 0.508 on 1 edges, made by hand

    # F5_s2 → F5_t1 (cut)
    with BuildSketch(Plane.YZ.offset(-5.842)):
        with BuildLine():
            ThreePointArc((-17.0551408962, -10.1973148855), (-16.906351141, -10.5565251304), (-16.5471408962, -10.7053148855))
            Line((-16.5471408962, -10.7053148855), (-17.0551408962, -10.7053148855))
            Line((-17.0551408962, -10.7053148855), (-17.0551408962, -10.1973148855))
        make_face()
    extrude(amount=F5_T1_DEPTH, mode=Mode.SUBTRACT)


with BuildPart() as f5_tool4:
    # F5_s5 → F5_t6 (new body)
    with BuildSketch(Plane.XZ.offset(16.5471408962)):
        with Locations((-6.096, -10.4513148855)):
            Rectangle(F5_S5_W, F5_S5_H)
    extrude(amount=F5_T6_DEPTH)

    # F5_s7 → F5_t8 (revolve, cut)
    with BuildSketch(Plane(origin=(-5.842, -16.5471408962, -10.1973148855), x_dir=(0.7071067812, 0, 0.7071067812), z_dir=(0.7071067812, 0, -0.7071067812))):
        with BuildLine():
            ThreePointArc((0, -0.508), (0.508, 0), (0, 0.508))
            Line((0, 0.508), (0, -0.508))
        make_face()
    revolve(axis=Axis((-5.842, -16.5471408962, -10.1973148855), (0, -1, 0)), mode=Mode.SUBTRACT)


with BuildPart() as f1_13:
    add(f1_12.part)

    # F5_t3: cut F5_tool4
    add(f5_tool4.part, mode=Mode.SUBTRACT)


with BuildPart() as f5_tool10:
    # F5_s11 → F5_t12 (new body)
    with BuildSketch(Plane.XZ.offset(16.5471408962)):
        with Locations((6.096, -10.4513148855)):
            Rectangle(F5_S11_W, F5_S11_H)
    extrude(amount=F5_T12_DEPTH)

    # F5_s13 → F5_t14 (revolve, cut)
    with BuildSketch(Plane(origin=(5.842, -16.5471408962, -10.1973148855), x_dir=(-0.7071067812, 0, 0.7071067812), z_dir=(0.7071067812, 0, 0.7071067812))):
        with BuildLine():
            ThreePointArc((0, -0.508), (0.508, 0), (0, 0.508))
            Line((0, 0.508), (0, -0.508))
        make_face()
    revolve(axis=Axis((5.842, -16.5471408962, -10.1973148855), (0, -1, 0)), mode=Mode.SUBTRACT)


with BuildPart() as f1_14:
    add(f1_13.part)

    # F5_t9: cut F5_tool10
    add(f5_tool10.part, mode=Mode.SUBTRACT)

    # F6: fillet of radius 0.508 on 1 edges, made by hand

    # F6_s2 → F6_t1 (cut)
    with BuildSketch(Plane.YZ.offset(-5.842)):
        with BuildLine():
            ThreePointArc((-23.4051408962, 18.3329497761), (-23.256351141, 17.9737395313), (-22.8971408962, 17.8249497761))
            Line((-22.8971408962, 17.8249497761), (-23.4051408962, 17.8249497761))
            Line((-23.4051408962, 17.8249497761), (-23.4051408962, 18.3329497761))
        make_face()
    extrude(amount=F6_T1_DEPTH, mode=Mode.SUBTRACT)


with BuildPart() as f6_tool4:
    # F6_s5 → F6_t6 (new body)
    with BuildSketch(Plane.XZ.offset(22.8971408962)):
        with Locations((-6.096, 18.0789497761)):
            Rectangle(F6_S5_W, F6_S5_H)
    extrude(amount=F6_T6_DEPTH)

    # F6_s7 → F6_t8 (revolve, cut)
    with BuildSketch(Plane(origin=(-5.842, -22.8971408962, 18.3329497761), x_dir=(0.7071067812, 0, 0.7071067812), z_dir=(0.7071067812, 0, -0.7071067812))):
        with BuildLine():
            ThreePointArc((0, -0.508), (0.508, 0), (0, 0.508))
            Line((0, 0.508), (0, -0.508))
        make_face()
    revolve(axis=Axis((-5.842, -22.8971408962, 18.3329497761), (0, -1, 0)), mode=Mode.SUBTRACT)


with BuildPart() as f1_15:
    add(f1_14.part)

    # F6_t3: cut F6_tool4
    add(f6_tool4.part, mode=Mode.SUBTRACT)


with BuildPart() as f6_tool10:
    # F6_s11 → F6_t12 (new body)
    with BuildSketch(Plane.XZ.offset(22.8971408962)):
        with Locations((6.096, 18.0789497761)):
            Rectangle(F6_S11_W, F6_S11_H)
    extrude(amount=F6_T12_DEPTH)

    # F6_s13 → F6_t14 (revolve, cut)
    with BuildSketch(Plane(origin=(5.842, -22.8971408962, 18.3329497761), x_dir=(-0.7071067812, 0, 0.7071067812), z_dir=(0.7071067812, 0, 0.7071067812))):
        with BuildLine():
            ThreePointArc((0, -0.508), (0.508, 0), (0, 0.508))
            Line((0, 0.508), (0, -0.508))
        make_face()
    revolve(axis=Axis((5.842, -22.8971408962, 18.3329497761), (0, -1, 0)), mode=Mode.SUBTRACT)


with BuildPart() as f1_16:
    add(f1_15.part)

    # F6_t9: cut F6_tool10
    add(f6_tool10.part, mode=Mode.SUBTRACT)

    # F8
    with Locations(Plane.XY.offset(24.1749497761)):
        with Locations((0, -15.1246003807)):
            Hole(F8_D / 2, depth=F8_DEPTH)
            with Locations((0, 0, -(F8_DEPTH + F8_TIP / 2))):  # 118° drill point
                Cone(0, F8_D / 2, F8_TIP, mode=Mode.SUBTRACT)

    # F10 (through all)
    with Locations(Plane.XY.offset(24.1749497761)):
        with Locations((3.7932256237, -20.6758901477)):
            Hole(F10_D / 2)


solid = f1_16.part
